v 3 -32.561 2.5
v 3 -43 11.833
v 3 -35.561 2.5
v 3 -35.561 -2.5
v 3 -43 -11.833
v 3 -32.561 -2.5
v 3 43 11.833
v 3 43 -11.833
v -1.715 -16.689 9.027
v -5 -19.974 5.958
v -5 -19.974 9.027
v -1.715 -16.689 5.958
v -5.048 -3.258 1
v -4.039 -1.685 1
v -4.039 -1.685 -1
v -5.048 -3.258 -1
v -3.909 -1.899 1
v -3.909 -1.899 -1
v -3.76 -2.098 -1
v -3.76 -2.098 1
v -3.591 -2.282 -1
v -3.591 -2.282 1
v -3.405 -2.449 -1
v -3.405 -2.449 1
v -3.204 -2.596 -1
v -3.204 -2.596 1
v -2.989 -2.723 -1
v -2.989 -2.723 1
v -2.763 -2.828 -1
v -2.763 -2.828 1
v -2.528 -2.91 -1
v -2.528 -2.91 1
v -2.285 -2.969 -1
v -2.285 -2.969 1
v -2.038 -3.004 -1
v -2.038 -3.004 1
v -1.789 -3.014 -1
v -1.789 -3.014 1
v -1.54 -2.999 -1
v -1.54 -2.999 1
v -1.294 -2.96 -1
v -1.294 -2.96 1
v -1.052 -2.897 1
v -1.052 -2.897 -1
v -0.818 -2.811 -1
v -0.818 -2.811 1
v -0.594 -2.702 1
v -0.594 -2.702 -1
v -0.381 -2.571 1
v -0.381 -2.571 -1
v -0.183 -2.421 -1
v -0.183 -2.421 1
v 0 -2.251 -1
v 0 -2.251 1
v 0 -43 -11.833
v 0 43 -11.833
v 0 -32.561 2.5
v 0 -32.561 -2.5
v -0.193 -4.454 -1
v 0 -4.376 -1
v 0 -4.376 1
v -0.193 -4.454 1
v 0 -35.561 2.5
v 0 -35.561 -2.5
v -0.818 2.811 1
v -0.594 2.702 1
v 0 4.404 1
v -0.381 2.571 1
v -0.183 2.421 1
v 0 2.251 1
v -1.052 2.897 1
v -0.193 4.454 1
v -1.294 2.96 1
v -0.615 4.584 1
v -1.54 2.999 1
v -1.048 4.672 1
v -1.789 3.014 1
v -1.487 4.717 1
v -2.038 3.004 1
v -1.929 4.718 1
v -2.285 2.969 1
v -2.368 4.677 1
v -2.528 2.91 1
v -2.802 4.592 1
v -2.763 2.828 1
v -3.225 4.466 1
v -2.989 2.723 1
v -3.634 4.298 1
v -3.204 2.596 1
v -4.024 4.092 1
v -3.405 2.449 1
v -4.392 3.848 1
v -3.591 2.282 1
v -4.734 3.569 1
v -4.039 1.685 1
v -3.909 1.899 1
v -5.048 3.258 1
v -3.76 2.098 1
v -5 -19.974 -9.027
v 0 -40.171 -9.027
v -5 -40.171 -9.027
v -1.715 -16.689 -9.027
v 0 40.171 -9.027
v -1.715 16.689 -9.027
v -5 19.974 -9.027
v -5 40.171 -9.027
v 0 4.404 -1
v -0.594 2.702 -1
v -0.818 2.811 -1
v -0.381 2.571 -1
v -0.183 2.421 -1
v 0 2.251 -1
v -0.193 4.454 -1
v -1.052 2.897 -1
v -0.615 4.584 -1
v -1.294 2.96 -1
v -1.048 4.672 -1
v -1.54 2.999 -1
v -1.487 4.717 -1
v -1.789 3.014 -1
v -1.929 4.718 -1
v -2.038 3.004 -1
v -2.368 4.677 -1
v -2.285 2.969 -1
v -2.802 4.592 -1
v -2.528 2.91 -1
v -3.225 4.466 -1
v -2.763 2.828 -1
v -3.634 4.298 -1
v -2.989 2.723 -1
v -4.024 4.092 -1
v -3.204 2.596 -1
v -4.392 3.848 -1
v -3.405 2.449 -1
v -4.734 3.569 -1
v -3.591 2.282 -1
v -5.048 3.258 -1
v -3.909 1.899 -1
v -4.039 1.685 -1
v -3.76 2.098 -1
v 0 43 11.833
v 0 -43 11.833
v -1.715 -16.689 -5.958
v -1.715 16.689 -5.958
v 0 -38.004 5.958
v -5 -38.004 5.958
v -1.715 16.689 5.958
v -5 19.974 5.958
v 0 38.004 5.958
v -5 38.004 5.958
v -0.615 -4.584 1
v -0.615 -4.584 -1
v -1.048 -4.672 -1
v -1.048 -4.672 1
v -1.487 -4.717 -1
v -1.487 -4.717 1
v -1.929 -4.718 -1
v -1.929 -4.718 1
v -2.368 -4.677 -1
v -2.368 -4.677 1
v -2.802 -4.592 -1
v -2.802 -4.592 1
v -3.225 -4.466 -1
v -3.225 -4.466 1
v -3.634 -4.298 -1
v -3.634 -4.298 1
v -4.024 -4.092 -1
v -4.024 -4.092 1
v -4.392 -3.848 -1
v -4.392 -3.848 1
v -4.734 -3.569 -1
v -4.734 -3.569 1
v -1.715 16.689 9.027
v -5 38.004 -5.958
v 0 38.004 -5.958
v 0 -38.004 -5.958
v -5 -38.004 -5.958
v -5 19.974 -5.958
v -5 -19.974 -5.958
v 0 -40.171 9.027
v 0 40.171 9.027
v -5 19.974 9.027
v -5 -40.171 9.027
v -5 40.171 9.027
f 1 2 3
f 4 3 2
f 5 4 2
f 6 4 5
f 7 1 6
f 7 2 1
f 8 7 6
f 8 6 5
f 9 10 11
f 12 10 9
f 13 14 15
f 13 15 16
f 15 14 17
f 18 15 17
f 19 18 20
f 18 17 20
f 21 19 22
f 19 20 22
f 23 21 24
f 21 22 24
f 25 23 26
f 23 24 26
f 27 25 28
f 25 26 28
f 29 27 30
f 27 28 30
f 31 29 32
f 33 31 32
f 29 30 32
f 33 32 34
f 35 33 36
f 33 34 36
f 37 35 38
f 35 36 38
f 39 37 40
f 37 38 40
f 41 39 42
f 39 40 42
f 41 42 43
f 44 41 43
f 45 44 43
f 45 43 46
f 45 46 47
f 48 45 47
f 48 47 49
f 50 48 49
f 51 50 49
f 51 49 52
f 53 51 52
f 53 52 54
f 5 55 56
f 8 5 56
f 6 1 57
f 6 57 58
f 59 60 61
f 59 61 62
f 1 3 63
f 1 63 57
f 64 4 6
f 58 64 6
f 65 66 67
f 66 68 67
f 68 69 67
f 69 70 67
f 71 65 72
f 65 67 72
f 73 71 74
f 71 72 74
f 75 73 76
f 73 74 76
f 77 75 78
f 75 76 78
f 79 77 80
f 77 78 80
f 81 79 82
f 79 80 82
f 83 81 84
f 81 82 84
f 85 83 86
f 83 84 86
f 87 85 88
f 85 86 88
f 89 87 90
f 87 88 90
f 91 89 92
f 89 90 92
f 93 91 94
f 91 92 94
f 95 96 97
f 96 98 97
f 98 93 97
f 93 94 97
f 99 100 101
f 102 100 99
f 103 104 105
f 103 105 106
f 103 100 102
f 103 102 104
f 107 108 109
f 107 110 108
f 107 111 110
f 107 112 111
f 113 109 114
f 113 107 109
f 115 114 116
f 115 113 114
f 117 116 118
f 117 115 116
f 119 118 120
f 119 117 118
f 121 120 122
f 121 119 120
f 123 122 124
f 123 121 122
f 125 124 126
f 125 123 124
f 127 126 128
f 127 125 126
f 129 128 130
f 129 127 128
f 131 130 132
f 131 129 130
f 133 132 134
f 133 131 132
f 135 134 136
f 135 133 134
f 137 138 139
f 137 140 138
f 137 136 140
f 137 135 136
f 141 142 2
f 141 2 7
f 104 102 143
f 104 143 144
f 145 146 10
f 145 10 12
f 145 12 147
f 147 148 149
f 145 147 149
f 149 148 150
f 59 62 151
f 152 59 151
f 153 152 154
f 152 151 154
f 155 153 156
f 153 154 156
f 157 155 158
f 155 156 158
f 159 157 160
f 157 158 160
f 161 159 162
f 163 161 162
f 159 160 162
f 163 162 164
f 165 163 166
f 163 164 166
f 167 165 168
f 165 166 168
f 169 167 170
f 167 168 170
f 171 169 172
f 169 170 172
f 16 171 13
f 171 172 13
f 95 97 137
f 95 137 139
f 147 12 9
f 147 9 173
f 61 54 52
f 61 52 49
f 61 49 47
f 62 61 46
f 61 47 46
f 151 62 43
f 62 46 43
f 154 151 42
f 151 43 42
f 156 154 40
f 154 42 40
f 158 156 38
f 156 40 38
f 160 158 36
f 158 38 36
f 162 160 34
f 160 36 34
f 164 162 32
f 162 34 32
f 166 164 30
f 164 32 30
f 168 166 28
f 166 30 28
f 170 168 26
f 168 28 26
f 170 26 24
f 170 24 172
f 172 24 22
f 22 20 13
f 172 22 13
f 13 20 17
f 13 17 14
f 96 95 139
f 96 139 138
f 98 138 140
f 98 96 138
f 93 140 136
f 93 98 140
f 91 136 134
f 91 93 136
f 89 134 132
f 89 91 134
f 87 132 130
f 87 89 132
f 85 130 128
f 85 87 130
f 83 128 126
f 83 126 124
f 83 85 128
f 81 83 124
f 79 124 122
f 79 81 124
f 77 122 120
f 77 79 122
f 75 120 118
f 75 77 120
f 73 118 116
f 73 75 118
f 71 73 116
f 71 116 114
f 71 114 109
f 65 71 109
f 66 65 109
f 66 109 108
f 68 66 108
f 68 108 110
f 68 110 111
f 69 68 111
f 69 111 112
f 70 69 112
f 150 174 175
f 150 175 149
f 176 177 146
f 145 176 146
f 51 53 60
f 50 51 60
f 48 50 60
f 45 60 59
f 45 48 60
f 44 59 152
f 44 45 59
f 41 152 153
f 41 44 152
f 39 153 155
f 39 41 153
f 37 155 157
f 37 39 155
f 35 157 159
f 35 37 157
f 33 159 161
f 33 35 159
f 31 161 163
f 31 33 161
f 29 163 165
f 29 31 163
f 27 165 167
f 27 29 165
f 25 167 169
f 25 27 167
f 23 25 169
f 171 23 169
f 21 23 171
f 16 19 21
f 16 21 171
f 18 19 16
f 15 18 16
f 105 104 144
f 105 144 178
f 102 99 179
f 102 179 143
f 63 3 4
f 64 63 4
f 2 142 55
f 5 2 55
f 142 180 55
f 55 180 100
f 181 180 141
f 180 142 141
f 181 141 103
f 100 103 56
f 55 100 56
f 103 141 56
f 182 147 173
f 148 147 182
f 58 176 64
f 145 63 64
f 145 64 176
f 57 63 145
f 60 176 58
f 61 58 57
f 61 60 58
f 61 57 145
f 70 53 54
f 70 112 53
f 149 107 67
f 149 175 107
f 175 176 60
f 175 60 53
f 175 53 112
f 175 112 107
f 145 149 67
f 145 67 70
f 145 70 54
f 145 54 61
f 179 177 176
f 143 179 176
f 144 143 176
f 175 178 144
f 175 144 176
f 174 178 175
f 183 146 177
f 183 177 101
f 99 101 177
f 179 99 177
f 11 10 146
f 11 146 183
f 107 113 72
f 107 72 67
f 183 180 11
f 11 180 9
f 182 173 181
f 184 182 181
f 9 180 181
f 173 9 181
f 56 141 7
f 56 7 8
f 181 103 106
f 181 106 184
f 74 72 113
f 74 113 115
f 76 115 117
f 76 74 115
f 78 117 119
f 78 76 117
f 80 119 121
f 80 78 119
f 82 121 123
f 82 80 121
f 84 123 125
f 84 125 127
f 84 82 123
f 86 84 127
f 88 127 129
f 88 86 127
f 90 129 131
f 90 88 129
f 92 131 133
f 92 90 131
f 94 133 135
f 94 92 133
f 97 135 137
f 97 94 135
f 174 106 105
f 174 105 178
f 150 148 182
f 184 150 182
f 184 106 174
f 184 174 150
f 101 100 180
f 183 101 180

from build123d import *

# Parameters (mm, degrees)
SKETCH1_W               = 23.666666666
SKETCH1_H               = 86
BOSS_EXTRUDE1_DEPTH     = 3
SKETCH2_W               = 5
SKETCH2_H               = 3
CUT_EXTRUDE1_DEPTH      = 45.699303997
SKETCH3_W               = 18.054262684
SKETCH3_H               = 80.34146894
BOSS_EXTRUDE2_DEPTH     = 5
SKETCH5_W               = 11.91581337
SKETCH5_H               = 76.008445896
CUT_EXTRUDE2_DEPTH      = 5
CUT_EXTRUDE3_DEPTH      = 45.877920827
CUT_EXTRUDE3_DEPTH_BACK = 45.877920827
SKETCH7_W               = 2
SKETCH7_H               = 9
BOSS_EXTRUDE3_DEPTH     = 5
CUT_EXTRUDE4_DEPTH      = 5
SKETCH9_W               = 2.534423144
SKETCH9_H               = 2
CUT_EXTRUDE5_DEPTH      = 1
CUT_EXTRUDE6_DEPTH      = 2
BOSS_EXTRUDE5_DEPTH     = 2
BOSS_EXTRUDE6_DEPTH     = 2
CUT_EXTRUDE7_START      = -2
CUT_EXTRUDE7_DEPTH      = 2


with BuildPart() as part:
    # Sketch1 → Boss-Extrude1 (new body)
    with BuildSketch(Plane(origin=(0, 0, 0), x_dir=(0, 0, -1), z_dir=(1, 0, 0))):
        Rectangle(SKETCH1_W, SKETCH1_H)
    extrude(amount=BOSS_EXTRUDE1_DEPTH)

    # Sketch2 → Cut-Extrude1 (cut, through all)
    with BuildSketch(Plane(origin=(3, 0, 0), x_dir=(0, 0, -1), z_dir=(1, 0, 0))):
        with Locations((0, -34.060962647)):
            Rectangle(SKETCH2_W, SKETCH2_H)
    extrude(amount=-CUT_EXTRUDE1_DEPTH, mode=Mode.SUBTRACT)

    # Sketch3 → Boss-Extrude2 (add)
    with BuildSketch(Plane.ZY):
        Rectangle(SKETCH3_W, SKETCH3_H)
    extrude(amount=BOSS_EXTRUDE2_DEPTH)

    # Sketch5 → Cut-Extrude2 (cut)
    with BuildSketch(Plane.ZY.offset(5)):
        Rectangle(SKETCH5_W, SKETCH5_H)
    extrude(amount=-CUT_EXTRUDE2_DEPTH, mode=Mode.SUBTRACT)

    # Sketch6 → Cut-Extrude3 (cut, two sides: drawn at the far end of the back side and taken through both)
    with BuildSketch(Plane.XY.offset(-CUT_EXTRUDE3_DEPTH_BACK)):
        Polygon((-5, -19.974207963), (-1.714874455, -16.689082418), (-1.714874455, 16.689082418), (-5, 19.974207963), align=None)
    extrude(amount=CUT_EXTRUDE3_DEPTH + CUT_EXTRUDE3_DEPTH_BACK, mode=Mode.SUBTRACT)

    # Sketch7 → Boss-Extrude3 (add)
    with BuildSketch(Plane.ZY):
        Rectangle(SKETCH7_W, SKETCH7_H)
    extrude(amount=BOSS_EXTRUDE3_DEPTH)

    # Sketch8 → Cut-Extrude4 (cut)
    with BuildSketch(Plane.XY.offset(1)):
        with BuildLine():
            ThreePointArc((-5, -0.459578833), (-2.44210099, -2.530530169), (0, -0.32421434))
            Line((0, -0.32421434), (0, 0.32421434))
            ThreePointArc((0, 0.32421434), (-2.44210099, 2.530530169), (-5, 0.459578833))
            Line((-5, 0.459578833), (-5, -0.459578833))
        make_face()
        with BuildLine():
            Line((-5, -4.5), (-2.510609776, -4.5))
            ThreePointArc((-2.510609776, -4.5), (-3.81075192, -4.308088951), (-5, -3.748724625))
            Line((-5, -3.748724625), (-5, -4.5))
        make_face()
        with BuildLine():
            Line((-2.510609776, -4.5), (0, -4.5))
            Line((0, -4.5), (0, -3.734546632))
            ThreePointArc((0, -3.734546632), (-1.198256898, -4.304384965), (-2.510609776, -4.5))
        make_face()
        with BuildLine():
            ThreePointArc((-2.510609794, 4.5), (-1.198256907, 4.304384967), (0, 3.734546632))
            Line((0, 3.734546632), (0, 4.5))
            Line((0, 4.5), (-2.510609794, 4.5))
        make_face()
        with BuildLine():
            ThreePointArc((-5, 3.748724625), (-3.810751929, 4.308088948), (-2.510609794, 4.5))
            Line((-2.510609794, 4.5), (-5, 4.5))
            Line((-5, 4.5), (-5, 3.748724625))
        make_face()
    extrude(amount=-CUT_EXTRUDE4_DEPTH, mode=Mode.SUBTRACT)

    # Sketch9 → Cut-Extrude5 (cut)
    with BuildSketch(Plane.ZY.offset(5)):
        Rectangle(SKETCH9_W, SKETCH9_H)
    extrude(amount=-CUT_EXTRUDE5_DEPTH, mode=Mode.SUBTRACT)

    # Sketch12 → Cut-Extrude6 (cut)
    with BuildSketch(Plane.XY.offset(1)):
        with BuildLine():
            Line((-4.836179898, -1), (-5, -1))
            Line((-5, -1), (-5, -3.748724625))
            ThreePointArc((-5, -3.748724625), (-2.497849634, -4.499981909), (0, -3.734546632))
            Line((0, -3.734546632), (0, -0.32421434))
            ThreePointArc((0, -0.32421434), (-2.160279243, -2.507098902), (-4.836179898, -1))
        make_face()
        with BuildLine():
            Line((-5, 3.748724625), (-5, 1))
            Line((-5, 1), (-4.836179898, 1))
            ThreePointArc((-4.836179898, 1), (-2.160279243, 2.507098902), (0, 0.32421434))
            Line((0, 0.32421434), (0, 3.734546632))
            ThreePointArc((0, 3.734546632), (-2.497849634, 4.499981909), (-5, 3.748724625))
        make_face()
    extrude(amount=-CUT_EXTRUDE6_DEPTH, mode=Mode.SUBTRACT)

    # Sketch10 → Boss-Extrude5 (add)
    with BuildSketch(Plane.XY.offset(1)):
        with BuildLine():
            Line((0.632034053, -1.144834058), (-0.193, -4.453864907))
            ThreePointArc((-0.193, -4.453864907), (-2.801828378, -4.592278965), (-5.047908598, -3.258012274))
            Line((-5.047908598, -3.258012274), (-4.41989103, -0.739171385))
            Line((-4.41989103, -0.739171385), (-4.335953587, -0.66680401))
            ThreePointArc((-4.335953587, -0.66680401), (-2.053682052, -3.002243354), (0.632034053, -1.144834058))
        make_face()
        with BuildLine():
            Line((-5.047908598, 3.258012274), (-4.41989103, 0.739171385))
            Line((-4.41989103, 0.739171385), (-4.335953587, 0.66680401))
            ThreePointArc((-4.335953587, 0.66680401), (-2.053682052, 3.002243354), (0.632034053, 1.144834058))
            Line((0.632034053, 1.144834058), (-0.193, 4.453864907))
            ThreePointArc((-0.193, 4.453864907), (-2.801828378, 4.592278965), (-5.047908598, 3.258012274))
        make_face()
    extrude(amount=-BOSS_EXTRUDE5_DEPTH)

    # Sketch13 → Boss-Extrude6 (add)
    with BuildSketch(Plane(origin=(0, 0, -1), x_dir=(-1, 0, 0), z_dir=(0, 0, -1))):
        Polygon((0, 3.679784186), (0.193, 4.453864907), (-0.617433114, 4.244828064), (-0.739085506, -4.079345447), (0.193, -4.453864907), (0, -3.679784186), (0, -2.250971384), (0, 2.250971384), align=None)
    extrude(amount=-BOSS_EXTRUDE6_DEPTH)

    # Sketch15 → Cut-Extrude7 (cut)
    with BuildSketch(Plane(origin=(0, 0, -1), x_dir=(-1, 0, 0), z_dir=(0, 0, -1)).offset(CUT_EXTRUDE7_START)):
        Polygon((4.65583066, 1.685473556), (5.047908598, 3.258012274), (4.038538563, 1.685473556), align=None)
        with BuildLine():
            Line((4.65583066, 1.685473556), (4.038538563, 1.685473556))
            ThreePointArc((4.038538563, 1.685473556), (4.241224486, 1.191898546), (4.335953587, 0.66680401))
            Line((4.335953587, 0.66680401), (4.41989103, 0.739171385))
            Line((4.41989103, 0.739171385), (4.65583066, 1.685473556))
        make_face()
        with BuildLine():
            ThreePointArc((4.335953587, -0.66680401), (4.241224486, -1.191898546), (4.038538563, -1.685473556))
            Line((4.038538563, -1.685473556), (4.65583066, -1.685473556))
            Line((4.65583066, -1.685473556), (4.41989103, -0.739171385))
            Line((4.41989103, -0.739171385), (4.335953587, -0.66680401))
        make_face()
        Polygon((4.65583066, -1.685473556), (4.038538563, -1.685473556), (5.047908598, -3.258012274), align=None)
    extrude(amount=CUT_EXTRUDE7_DEPTH, mode=Mode.SUBTRACT)


solid = part.part
